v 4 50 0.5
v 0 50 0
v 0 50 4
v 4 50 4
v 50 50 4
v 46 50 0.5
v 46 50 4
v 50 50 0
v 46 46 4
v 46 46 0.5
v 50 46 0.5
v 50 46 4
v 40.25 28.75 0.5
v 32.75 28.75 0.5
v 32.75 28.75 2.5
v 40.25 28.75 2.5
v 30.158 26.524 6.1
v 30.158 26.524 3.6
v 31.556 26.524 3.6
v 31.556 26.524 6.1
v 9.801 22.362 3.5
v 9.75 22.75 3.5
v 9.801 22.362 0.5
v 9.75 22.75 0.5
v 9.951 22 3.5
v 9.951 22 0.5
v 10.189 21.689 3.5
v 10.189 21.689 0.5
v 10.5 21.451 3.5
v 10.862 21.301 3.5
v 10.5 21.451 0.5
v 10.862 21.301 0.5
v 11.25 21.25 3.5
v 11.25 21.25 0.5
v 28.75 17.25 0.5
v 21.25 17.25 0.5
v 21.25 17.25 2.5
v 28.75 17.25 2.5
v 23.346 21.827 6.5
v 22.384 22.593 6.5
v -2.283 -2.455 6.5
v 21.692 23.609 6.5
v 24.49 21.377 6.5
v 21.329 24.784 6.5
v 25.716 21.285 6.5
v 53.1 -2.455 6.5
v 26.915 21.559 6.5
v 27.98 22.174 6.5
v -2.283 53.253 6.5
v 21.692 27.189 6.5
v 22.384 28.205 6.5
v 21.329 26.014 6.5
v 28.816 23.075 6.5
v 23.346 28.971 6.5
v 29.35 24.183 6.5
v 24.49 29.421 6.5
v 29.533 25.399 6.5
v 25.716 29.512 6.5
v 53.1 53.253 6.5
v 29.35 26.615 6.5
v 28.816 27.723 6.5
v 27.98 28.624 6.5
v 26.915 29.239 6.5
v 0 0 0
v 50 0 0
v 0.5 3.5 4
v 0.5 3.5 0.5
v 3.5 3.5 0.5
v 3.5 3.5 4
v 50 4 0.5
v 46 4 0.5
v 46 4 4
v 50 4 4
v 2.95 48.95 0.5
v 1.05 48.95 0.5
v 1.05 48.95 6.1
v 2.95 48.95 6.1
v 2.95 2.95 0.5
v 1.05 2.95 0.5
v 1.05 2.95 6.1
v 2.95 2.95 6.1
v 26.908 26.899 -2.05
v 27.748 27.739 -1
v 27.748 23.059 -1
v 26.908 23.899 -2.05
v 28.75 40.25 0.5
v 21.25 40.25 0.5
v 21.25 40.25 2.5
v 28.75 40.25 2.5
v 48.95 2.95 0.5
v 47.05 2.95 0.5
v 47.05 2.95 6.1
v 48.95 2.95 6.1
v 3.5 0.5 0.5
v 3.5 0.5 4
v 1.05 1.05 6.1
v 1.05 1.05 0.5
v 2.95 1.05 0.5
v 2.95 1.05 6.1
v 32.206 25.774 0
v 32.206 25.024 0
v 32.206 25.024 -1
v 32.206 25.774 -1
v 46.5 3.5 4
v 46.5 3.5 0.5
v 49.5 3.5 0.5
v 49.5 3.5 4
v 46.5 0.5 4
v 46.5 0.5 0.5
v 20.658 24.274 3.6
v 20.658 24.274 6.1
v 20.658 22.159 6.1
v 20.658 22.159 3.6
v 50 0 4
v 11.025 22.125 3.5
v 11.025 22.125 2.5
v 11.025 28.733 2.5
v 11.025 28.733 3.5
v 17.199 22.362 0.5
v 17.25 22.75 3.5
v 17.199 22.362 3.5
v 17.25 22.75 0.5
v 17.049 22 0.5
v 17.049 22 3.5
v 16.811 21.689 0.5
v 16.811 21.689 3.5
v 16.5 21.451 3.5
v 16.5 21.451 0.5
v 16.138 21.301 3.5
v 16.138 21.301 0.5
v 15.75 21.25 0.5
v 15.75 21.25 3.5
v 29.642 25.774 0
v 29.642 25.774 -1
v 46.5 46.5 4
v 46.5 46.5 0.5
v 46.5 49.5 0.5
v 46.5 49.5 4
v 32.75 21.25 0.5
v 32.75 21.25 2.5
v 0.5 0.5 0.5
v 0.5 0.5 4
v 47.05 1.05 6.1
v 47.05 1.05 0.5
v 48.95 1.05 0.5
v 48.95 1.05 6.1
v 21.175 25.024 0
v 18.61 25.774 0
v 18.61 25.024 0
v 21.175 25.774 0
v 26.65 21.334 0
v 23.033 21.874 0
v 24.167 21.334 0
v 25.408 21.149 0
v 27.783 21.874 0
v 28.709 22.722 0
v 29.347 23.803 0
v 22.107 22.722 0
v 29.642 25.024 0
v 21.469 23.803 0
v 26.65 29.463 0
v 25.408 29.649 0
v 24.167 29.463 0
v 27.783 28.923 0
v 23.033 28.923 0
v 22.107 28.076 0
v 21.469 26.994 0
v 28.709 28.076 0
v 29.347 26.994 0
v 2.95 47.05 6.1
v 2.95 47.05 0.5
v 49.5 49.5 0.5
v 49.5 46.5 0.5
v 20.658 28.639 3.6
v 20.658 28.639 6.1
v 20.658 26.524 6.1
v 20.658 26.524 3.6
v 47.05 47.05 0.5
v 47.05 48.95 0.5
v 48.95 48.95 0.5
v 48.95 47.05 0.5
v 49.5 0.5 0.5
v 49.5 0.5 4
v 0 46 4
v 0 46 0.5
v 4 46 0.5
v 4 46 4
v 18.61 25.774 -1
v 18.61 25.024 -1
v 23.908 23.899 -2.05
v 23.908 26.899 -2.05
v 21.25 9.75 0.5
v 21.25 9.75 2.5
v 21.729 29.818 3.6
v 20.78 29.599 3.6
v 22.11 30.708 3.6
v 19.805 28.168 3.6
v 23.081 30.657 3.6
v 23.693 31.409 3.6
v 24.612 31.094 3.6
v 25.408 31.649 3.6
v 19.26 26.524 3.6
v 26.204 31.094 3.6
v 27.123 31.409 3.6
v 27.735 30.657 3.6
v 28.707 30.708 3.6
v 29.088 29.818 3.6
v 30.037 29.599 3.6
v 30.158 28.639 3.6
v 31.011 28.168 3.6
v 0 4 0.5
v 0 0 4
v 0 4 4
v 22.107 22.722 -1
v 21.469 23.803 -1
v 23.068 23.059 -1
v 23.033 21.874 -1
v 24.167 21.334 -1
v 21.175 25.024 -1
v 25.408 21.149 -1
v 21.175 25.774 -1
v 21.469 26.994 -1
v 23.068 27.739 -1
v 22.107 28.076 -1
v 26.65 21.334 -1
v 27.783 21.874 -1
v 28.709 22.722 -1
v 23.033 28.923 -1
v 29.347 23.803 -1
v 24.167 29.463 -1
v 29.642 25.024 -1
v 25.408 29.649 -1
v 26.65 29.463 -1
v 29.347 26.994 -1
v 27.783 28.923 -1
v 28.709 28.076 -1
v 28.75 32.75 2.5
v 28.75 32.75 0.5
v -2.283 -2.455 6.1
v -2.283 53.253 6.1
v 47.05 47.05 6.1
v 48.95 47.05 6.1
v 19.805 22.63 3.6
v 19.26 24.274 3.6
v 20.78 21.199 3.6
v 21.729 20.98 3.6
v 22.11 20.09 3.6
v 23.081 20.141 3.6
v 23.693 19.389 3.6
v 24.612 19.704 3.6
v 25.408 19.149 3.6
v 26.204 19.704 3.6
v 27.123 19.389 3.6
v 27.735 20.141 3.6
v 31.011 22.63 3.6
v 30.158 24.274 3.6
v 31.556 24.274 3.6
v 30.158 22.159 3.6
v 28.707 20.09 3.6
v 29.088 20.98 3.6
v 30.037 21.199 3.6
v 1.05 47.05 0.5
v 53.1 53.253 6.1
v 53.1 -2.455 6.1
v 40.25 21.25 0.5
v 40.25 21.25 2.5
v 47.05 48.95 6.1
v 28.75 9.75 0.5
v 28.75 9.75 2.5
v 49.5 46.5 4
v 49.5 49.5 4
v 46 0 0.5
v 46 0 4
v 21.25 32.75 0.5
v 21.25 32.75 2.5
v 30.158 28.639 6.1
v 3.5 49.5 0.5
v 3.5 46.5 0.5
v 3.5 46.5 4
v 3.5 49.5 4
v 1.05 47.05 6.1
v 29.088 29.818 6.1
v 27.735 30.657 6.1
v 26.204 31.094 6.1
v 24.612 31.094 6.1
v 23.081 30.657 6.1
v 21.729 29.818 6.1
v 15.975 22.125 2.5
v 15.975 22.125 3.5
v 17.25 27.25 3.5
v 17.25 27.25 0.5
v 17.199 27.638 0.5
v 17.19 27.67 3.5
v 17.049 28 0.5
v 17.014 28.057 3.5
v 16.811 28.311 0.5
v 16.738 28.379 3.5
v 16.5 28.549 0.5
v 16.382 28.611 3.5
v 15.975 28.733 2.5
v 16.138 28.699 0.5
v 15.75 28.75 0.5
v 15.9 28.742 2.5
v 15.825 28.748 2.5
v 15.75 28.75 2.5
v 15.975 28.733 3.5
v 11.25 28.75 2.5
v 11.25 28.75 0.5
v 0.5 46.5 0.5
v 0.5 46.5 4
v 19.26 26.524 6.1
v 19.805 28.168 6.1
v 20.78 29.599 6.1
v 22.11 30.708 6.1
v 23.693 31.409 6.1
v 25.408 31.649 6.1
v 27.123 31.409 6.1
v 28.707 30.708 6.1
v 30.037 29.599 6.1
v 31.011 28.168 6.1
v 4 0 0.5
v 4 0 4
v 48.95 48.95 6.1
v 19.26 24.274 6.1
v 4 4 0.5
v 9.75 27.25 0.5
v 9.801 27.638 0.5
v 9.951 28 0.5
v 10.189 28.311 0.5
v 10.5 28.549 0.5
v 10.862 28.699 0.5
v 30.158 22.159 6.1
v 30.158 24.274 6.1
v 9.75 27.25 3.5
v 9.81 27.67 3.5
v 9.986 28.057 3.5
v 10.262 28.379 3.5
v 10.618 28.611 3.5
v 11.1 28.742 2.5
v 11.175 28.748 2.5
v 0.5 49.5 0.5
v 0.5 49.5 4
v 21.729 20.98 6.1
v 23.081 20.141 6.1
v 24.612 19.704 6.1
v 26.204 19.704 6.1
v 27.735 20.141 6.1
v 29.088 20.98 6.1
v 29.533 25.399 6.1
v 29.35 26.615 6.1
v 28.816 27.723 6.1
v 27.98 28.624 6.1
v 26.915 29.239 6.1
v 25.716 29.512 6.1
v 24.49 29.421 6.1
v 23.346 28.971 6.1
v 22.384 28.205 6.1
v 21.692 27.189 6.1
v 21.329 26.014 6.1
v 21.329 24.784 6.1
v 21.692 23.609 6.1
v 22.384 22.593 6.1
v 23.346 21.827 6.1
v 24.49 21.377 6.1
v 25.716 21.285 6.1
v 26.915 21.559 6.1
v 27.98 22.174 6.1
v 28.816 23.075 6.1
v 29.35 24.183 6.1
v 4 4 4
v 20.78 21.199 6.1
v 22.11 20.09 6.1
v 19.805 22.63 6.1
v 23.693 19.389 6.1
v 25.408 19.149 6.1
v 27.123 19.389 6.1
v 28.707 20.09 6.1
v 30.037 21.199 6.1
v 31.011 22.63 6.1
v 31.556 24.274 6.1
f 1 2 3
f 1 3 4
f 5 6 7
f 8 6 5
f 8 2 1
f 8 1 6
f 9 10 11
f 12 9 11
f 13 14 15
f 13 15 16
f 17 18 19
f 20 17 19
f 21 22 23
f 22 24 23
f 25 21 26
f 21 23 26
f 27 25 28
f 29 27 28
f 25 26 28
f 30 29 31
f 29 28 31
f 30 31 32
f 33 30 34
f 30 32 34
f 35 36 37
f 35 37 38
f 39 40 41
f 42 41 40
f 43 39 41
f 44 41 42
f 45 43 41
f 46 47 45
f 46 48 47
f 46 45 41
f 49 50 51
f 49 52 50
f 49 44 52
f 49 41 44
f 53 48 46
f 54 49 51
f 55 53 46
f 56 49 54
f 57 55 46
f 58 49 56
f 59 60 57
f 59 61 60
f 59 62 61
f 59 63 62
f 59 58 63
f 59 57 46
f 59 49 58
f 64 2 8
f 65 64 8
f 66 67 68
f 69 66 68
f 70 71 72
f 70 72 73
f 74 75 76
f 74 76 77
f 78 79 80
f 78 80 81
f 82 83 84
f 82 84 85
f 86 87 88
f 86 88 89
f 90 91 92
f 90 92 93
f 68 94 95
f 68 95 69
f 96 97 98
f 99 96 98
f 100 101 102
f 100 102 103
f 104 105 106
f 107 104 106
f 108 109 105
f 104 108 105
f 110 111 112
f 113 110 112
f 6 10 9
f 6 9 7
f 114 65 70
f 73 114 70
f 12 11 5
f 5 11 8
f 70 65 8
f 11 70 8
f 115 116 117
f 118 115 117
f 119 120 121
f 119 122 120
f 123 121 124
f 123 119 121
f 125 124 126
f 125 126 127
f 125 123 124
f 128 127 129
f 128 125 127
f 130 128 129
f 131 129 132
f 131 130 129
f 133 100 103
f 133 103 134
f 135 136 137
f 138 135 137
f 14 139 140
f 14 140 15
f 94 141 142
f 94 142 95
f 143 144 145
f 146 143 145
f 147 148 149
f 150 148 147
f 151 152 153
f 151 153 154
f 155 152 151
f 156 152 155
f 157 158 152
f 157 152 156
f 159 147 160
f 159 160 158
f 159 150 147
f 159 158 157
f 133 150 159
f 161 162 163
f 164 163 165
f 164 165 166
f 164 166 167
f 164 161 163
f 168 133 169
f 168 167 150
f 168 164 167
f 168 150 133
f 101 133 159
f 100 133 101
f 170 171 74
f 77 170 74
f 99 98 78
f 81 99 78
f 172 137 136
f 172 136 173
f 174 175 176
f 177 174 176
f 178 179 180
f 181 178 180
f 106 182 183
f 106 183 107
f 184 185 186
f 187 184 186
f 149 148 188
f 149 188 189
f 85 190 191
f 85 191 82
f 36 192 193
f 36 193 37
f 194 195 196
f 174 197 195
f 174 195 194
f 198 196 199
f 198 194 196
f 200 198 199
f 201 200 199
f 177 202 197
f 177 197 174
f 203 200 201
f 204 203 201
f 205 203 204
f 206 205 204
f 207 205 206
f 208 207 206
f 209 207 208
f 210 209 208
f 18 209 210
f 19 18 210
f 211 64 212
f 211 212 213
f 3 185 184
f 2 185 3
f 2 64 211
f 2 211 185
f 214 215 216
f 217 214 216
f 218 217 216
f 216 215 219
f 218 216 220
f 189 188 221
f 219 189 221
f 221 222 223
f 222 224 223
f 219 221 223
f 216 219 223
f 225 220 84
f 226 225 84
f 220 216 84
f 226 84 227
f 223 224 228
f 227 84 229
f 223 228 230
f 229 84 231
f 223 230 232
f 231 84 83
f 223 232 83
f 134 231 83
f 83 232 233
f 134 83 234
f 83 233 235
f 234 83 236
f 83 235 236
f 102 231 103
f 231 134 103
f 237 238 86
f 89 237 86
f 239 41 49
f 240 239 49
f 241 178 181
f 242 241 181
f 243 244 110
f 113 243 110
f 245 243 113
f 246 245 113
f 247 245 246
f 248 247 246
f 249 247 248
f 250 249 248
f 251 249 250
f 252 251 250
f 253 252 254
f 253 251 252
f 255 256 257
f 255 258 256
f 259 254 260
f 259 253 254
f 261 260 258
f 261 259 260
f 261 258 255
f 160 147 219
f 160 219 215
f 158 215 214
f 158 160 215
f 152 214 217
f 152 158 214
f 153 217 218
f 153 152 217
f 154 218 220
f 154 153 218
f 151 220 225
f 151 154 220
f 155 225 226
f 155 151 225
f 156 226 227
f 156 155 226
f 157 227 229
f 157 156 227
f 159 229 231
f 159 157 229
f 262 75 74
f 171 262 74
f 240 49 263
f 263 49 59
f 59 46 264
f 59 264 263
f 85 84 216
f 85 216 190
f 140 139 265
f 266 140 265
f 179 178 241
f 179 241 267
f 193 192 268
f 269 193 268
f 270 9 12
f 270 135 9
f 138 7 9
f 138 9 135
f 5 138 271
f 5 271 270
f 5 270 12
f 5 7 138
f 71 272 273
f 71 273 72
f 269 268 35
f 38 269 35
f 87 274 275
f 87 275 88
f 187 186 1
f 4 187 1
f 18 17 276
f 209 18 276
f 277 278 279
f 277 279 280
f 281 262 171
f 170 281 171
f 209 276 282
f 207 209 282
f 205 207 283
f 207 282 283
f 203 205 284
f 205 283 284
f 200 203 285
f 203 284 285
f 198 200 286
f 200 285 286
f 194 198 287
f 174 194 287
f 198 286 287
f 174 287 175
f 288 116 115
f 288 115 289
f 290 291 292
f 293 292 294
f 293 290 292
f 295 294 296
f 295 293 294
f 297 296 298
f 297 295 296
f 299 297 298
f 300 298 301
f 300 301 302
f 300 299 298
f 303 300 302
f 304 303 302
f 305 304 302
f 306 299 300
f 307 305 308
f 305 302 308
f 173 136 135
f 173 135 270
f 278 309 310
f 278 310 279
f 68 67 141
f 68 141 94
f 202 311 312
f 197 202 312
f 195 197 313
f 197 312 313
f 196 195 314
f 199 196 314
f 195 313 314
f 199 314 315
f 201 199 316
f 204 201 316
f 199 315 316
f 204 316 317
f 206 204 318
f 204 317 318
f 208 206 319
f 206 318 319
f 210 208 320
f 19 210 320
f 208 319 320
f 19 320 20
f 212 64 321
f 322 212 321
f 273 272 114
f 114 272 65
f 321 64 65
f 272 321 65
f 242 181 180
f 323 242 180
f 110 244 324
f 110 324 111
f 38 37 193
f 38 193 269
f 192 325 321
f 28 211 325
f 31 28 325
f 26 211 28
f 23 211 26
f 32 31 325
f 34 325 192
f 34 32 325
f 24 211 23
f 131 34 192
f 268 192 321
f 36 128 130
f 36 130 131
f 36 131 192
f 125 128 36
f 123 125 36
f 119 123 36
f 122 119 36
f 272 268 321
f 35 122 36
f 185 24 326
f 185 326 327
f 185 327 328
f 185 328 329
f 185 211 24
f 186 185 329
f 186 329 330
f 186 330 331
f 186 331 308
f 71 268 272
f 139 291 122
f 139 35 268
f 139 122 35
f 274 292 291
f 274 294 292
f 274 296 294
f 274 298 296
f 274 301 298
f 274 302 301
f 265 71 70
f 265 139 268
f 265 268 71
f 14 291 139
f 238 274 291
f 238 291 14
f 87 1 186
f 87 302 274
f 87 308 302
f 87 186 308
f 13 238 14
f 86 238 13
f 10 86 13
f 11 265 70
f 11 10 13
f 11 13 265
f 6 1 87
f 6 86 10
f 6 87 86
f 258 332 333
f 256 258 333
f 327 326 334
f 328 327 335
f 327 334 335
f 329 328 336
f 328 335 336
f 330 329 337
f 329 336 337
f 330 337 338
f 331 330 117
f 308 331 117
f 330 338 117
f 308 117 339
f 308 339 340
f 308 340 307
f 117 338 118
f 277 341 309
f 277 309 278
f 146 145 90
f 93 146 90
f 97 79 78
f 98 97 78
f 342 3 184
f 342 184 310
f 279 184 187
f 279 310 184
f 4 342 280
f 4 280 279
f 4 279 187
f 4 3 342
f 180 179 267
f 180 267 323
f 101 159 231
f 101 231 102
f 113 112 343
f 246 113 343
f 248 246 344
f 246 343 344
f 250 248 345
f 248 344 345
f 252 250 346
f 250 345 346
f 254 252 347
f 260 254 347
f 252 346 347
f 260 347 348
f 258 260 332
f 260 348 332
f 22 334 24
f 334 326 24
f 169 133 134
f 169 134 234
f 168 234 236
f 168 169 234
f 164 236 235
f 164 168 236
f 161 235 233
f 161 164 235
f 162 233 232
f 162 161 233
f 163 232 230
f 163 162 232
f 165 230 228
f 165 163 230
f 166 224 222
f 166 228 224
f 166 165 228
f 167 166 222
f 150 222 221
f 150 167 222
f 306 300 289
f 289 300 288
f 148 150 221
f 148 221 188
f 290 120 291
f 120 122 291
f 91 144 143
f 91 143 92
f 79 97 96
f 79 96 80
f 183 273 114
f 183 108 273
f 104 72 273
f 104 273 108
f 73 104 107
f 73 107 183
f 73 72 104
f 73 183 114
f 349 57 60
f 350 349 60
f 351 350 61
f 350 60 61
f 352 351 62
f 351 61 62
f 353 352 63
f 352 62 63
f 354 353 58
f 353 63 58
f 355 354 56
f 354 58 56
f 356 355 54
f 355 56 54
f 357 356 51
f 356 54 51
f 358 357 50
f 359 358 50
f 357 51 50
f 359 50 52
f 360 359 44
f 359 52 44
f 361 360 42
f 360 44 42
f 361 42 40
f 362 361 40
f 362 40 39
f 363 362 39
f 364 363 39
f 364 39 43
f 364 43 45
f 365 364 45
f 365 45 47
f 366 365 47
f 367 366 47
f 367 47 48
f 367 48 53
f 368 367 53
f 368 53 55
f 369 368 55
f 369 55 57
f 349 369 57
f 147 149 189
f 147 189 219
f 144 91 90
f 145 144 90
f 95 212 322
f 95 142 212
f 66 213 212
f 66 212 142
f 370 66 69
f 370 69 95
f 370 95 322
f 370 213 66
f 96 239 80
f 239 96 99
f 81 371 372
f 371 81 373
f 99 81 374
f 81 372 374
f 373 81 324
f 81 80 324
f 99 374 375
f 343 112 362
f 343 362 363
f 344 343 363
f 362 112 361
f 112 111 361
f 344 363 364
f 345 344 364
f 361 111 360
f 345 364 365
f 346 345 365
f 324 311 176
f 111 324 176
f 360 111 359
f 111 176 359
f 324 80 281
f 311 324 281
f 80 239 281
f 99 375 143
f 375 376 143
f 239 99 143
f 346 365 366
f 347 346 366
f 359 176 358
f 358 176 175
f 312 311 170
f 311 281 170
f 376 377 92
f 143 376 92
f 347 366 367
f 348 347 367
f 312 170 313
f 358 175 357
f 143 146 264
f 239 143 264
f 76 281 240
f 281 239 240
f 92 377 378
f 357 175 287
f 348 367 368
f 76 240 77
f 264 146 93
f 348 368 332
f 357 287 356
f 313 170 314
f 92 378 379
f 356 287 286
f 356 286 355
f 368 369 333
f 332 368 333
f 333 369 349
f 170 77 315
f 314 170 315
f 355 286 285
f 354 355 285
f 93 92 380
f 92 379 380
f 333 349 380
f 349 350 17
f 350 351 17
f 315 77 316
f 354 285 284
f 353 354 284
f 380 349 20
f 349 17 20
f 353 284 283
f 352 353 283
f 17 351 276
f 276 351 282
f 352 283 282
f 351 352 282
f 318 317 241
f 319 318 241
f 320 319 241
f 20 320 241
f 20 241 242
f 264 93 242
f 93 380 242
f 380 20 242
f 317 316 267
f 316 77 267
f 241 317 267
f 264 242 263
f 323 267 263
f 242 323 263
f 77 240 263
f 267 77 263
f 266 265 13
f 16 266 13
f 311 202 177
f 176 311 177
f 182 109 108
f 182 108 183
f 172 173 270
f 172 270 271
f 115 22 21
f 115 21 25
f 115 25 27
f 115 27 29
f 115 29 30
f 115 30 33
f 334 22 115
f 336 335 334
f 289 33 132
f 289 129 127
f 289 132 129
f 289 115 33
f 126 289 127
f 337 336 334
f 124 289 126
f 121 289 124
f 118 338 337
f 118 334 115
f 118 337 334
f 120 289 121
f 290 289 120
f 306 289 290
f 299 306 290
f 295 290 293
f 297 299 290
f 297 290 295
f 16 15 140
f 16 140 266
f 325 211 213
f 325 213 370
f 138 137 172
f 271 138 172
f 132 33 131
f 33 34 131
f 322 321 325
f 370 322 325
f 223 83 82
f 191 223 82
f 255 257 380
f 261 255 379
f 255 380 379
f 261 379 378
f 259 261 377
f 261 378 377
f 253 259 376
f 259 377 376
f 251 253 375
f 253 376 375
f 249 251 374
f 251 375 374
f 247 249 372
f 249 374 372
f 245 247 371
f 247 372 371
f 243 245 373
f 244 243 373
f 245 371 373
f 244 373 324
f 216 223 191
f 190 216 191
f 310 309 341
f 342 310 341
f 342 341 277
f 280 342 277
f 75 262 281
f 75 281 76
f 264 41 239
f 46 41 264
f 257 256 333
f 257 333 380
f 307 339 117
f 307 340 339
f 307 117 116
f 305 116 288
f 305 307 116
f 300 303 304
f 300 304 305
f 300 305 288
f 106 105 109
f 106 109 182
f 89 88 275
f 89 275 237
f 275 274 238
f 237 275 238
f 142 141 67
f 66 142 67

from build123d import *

# Parameters (mm, degrees)
F0_W          = 50
F0_H          = 50
F1_DEPTH      = 0.5
F2_W          = 4
F2_H          = 4
F2_W_2        = 3
F2_H_2        = 3
F3_DEPTH      = 3.5
F2_W_3        = 1.9
F2_H_3        = 1.9
F4_DEPTH      = 6
F5_W          = 55.382803781
F5_H          = 55.7085196488
F5_W_2        = 1.9
F5_H_2        = 1.9
F6_DEPTH      = 0.4
F7_R          = 4.125
F8_DEPTH      = 25
F9_R          = 6.25
F10_DEPTH     = 2.5
F11_W         = 7.5
F11_H         = 3.75
F11_H_2       = 7.5
F12_DEPTH     = 2
F13_W         = 4.95
F13_H         = 0.875
F14_DEPTH     = 1
F15_R         = 1.5
F16_W         = 15
F16_H         = 2.25
F17_DEPTH     = 2.5
F19_DEPTH     = 1
F20_W         = 5
F20_H         = 5
F21_DEPTH     = 1.05
F22_T4_DEPTH  = 11.4471090443
F22_T9_DEPTH  = 11.4471090443
F22_T14_DEPTH = 11.4471090443
F22_T19_DEPTH = 11.4471090443


# Not quite as in the source:
# - a fillet or chamfer that OpenCascade refuses, or shapes differently, is made with other operations: its cross-section is extruded or revolved along the edge and cut away or added
# - a feature names something its author has since deleted; it is built from what else it names


with BuildPart() as f1:
    # F0 (on Top) → F1 (new body)
    with BuildSketch(Plane.XY):
        with Locations((25, 25)):
            Rectangle(F0_W, F0_H)
    extrude(amount=F1_DEPTH)

    # F2 (on face) → F3 (join)
    with BuildSketch(Plane.XY.offset(0.5)):
        with Locations((48, 48)):
            Rectangle(F2_W, F2_H)
        with Locations((48, 48)):
            Rectangle(F2_W_2, F2_H_2, mode=Mode.SUBTRACT)
        with Locations((2, 48)):
            Rectangle(F2_W, F2_H)
        with Locations((2, 48)):
            Rectangle(F2_W_2, F2_H_2, mode=Mode.SUBTRACT)
        with Locations((2, 2)):
            Rectangle(F2_W, F2_H)
        with Locations((2, 2)):
            Rectangle(F2_W_2, F2_H_2, mode=Mode.SUBTRACT)
        with Locations((48, 2)):
            Rectangle(F2_W, F2_H)
        with Locations((48, 2)):
            Rectangle(F2_W_2, F2_H_2, mode=Mode.SUBTRACT)
    extrude(amount=F3_DEPTH)

    # F11 (on face) → F12 (join)
    with BuildSketch(Plane.XY.offset(0.5)):
        with Locations((13.5, 26.875)):
            Rectangle(F11_W, F11_H)
        with Locations((13.5, 23.125)):
            Rectangle(F11_W, F11_H)
        with Locations((25, 13.5)):
            Rectangle(F11_W, F11_H_2)
        with Locations((36.5, 25)):
            Rectangle(F11_W, F11_H_2)
        with Locations((25, 36.5)):
            Rectangle(F11_W, F11_H_2)
    extrude(amount=F12_DEPTH)

    # F13 (on face) → F14 (join)
    with BuildSketch(Plane.XY.offset(2.5)):
        Polygon((15.975, 22.125), (15.975, 21.25), (17.25, 21.25), (17.25, 28.75), (15.975, 28.75), align=None)
        with Locations((13.5, 21.6875)):
            Rectangle(F13_W, F13_H)
        Polygon((9.75, 21.25), (11.025, 21.25), (11.025, 22.125), (11.025, 28.75), (9.75, 28.75), align=None)
    extrude(amount=F14_DEPTH)

    # F15
    f15_edges = [f1.edges().sort_by_distance(p)[0] for p in [
        (9.75, 28.75, 2),
        (17.25, 28.75, 2),
        (17.25, 21.25, 2),
        (9.75, 21.25, 2),
    ]]
    fillet(f15_edges, radius=F15_R)


with BuildPart() as f4:
    # F2 (on face) → F4 (new body)
    with BuildSketch(Plane.XY.offset(0.5)):
        with Locations((2, 48)):
            Rectangle(F2_W_3, F2_H_3)
    extrude(amount=F4_DEPTH)



with BuildPart() as f4b:
    # F2 (on face) → F4, piece 2 (new body)
    with BuildSketch(Plane.XY.offset(0.5)):
        with Locations((48, 48)):
            Rectangle(F2_W_3, F2_H_3)
    extrude(amount=F4_DEPTH)


with BuildPart() as f4c:
    # F2 (on face) → F4, piece 3 (new body)
    with BuildSketch(Plane.XY.offset(0.5)):
        with Locations((48, 2)):
            Rectangle(F2_W_3, F2_H_3)
    extrude(amount=F4_DEPTH)


with BuildPart() as f4d:
    # F2 (on face) → F4, piece 4 (new body)
    with BuildSketch(Plane.XY.offset(0.5)):
        with Locations((2, 2)):
            Rectangle(F2_W_3, F2_H_3)
    extrude(amount=F4_DEPTH)


with BuildPart() as f4_1:
    add(f4.part)

    add(f4b.part)  # F6 merges F4b

    add(f4c.part)  # F6 merges F4c

    add(f4d.part)  # F6 merges F4d
    # F5 (on face) → F6 (join)
    with BuildSketch(Plane.XY.offset(6.5)):
        with Locations((25.4082191968, 25.3989326302)):
            Rectangle(F5_W, F5_H)
        with Locations((48, 48)):
            Rectangle(F5_W_2, F5_H_2, mode=Mode.SUBTRACT)
    extrude(amount=-F6_DEPTH)

    # F7 (on face) → F8 (cut)
    with BuildSketch(Plane.XY.offset(6.5)):
        with Locations((25.4082191968, 25.3989326302)):
            Circle(F7_R)
    extrude(amount=-F8_DEPTH, mode=Mode.SUBTRACT)

    # F9 (on face) → F10 (join)
    with BuildSketch(Plane(origin=(0, 0, 6.1), x_dir=(1, 0, 0), z_dir=(0, 0, -1))):
        with Locations((25.4082191968, -25.3989326302)):
            Circle(F9_R)
        with BuildLine():
            ThreePointArc((30.1582191968, -22.158562281), (30.9025344408, -23.7033501344), (31.1582191968, -25.3989326302))
            ThreePointArc((31.1582191968, -25.3989326302), (30.9025344408, -27.094515126), (30.1582191968, -28.6393029794))
            ThreePointArc((30.1582191968, -28.6393029794), (25.4082191968, -31.1489326302), (20.6582191968, -28.6393029794))
            ThreePointArc((20.6582191968, -28.6393029794), (19.6582191968, -25.3989326302), (20.6582191968, -22.158562281))
            ThreePointArc((20.6582191968, -22.158562281), (25.4082191968, -19.6489326302), (30.1582191968, -22.158562281))
        make_face(mode=Mode.SUBTRACT)
        with BuildLine():
            ThreePointArc((30.1582191968, -28.6393029794), (30.9025344408, -27.094515126), (31.1582191968, -25.3989326302))
            ThreePointArc((31.1582191968, -25.3989326302), (30.9025344408, -23.7033501344), (30.1582191968, -22.158562281))
            Line((30.1582191968, -22.158562281), (30.1582191968, -28.6393029794))
        make_face()
        with BuildLine():
            Line((20.6582191968, -28.6393029794), (20.6582191968, -22.158562281))
            ThreePointArc((20.6582191968, -22.158562281), (19.6582191968, -25.3989326302), (20.6582191968, -28.6393029794))
        make_face()
    extrude(amount=F10_DEPTH)

    # F16 (on face) → F17 (cut, through all)
    with BuildSketch(Plane(origin=(0, 0, 3.6), x_dir=(1, 0, 0), z_dir=(0, 0, -1))):
        with Locations((25.4082191968, -25.3989326302)):
            Rectangle(F16_W, F16_H)
    extrude(amount=-F17_DEPTH, mode=Mode.SUBTRACT)


with BuildPart() as f19:
    # F18 (on Top) → F19 (new body)
    with BuildSketch(Plane.XY):
        with BuildLine():
            ThreePointArc((29.6416427523, 25.0239326302), (29.6540730633, 25.2112495339), (29.6582191968, 25.3989326302))
            ThreePointArc((29.6582191968, 25.3989326302), (29.6540730633, 25.5866157265), (29.6416427523, 25.7739326302))
            Line((29.6416427523, 25.7739326302), (25.4082191968, 25.7739326302))
            Line((25.4082191968, 25.7739326302), (21.1747956414, 25.7739326302))
            ThreePointArc((21.1747956414, 25.7739326302), (21.1582191968, 25.3989326302), (21.1747956414, 25.0239326302))
            Line((21.1747956414, 25.0239326302), (25.4082191968, 25.0239326302))
            Line((25.4082191968, 25.0239326302), (29.6416427523, 25.0239326302))
        make_face()
        with BuildLine():
            ThreePointArc((29.6416427523, 25.7739326302), (29.6540730633, 25.5866157265), (29.6582191968, 25.3989326302))
            ThreePointArc((29.6582191968, 25.3989326302), (29.6540730633, 25.2112495339), (29.6416427523, 25.0239326302))
            Line((29.6416427523, 25.0239326302), (32.2061355105, 25.0239326302))
            Line((32.2061355105, 25.0239326302), (32.2061355105, 25.3989326302))
            Line((32.2061355105, 25.3989326302), (32.2061355105, 25.7739326302))
            Line((32.2061355105, 25.7739326302), (29.6416427523, 25.7739326302))
        make_face()
        with BuildLine():
            Line((25.4082191968, 25.7739326302), (29.6416427523, 25.7739326302))
            ThreePointArc((29.6416427523, 25.7739326302), (25.4082191968, 29.6489326302), (21.1747956414, 25.7739326302))
            Line((21.1747956414, 25.7739326302), (25.4082191968, 25.7739326302))
        make_face()
        with BuildLine():
            ThreePointArc((21.1747956414, 25.0239326302), (25.4082191968, 21.1489326302), (29.6416427523, 25.0239326302))
            Line((29.6416427523, 25.0239326302), (25.4082191968, 25.0239326302))
            Line((25.4082191968, 25.0239326302), (21.1747956414, 25.0239326302))
        make_face()
        with BuildLine():
            ThreePointArc((21.1747956414, 25.0239326302), (21.1582191968, 25.3989326302), (21.1747956414, 25.7739326302))
            Line((21.1747956414, 25.7739326302), (18.6103028832, 25.7739326302))
            Line((18.6103028832, 25.7739326302), (18.6103028832, 25.3989326302))
            Line((18.6103028832, 25.3989326302), (18.6103028832, 25.0239326302))
            Line((18.6103028832, 25.0239326302), (21.1747956414, 25.0239326302))
        make_face()
    extrude(amount=-F19_DEPTH)

    # F20 (on face) → F21 (join)
    with BuildSketch(Plane(origin=(0, 0, -1), x_dir=(1, 0, 0), z_dir=(0, 0, -1))):
        with Locations((25.4082191968, -25.3989326302)):
            Rectangle(F20_W, F20_H)
    extrude(amount=F21_DEPTH)

    # F22: chamfer of 1 x 1.25 on 4 edges, made by hand


with BuildPart() as f22_tool2:
    # F22_s3 → F22_t4 (new body)
    with BuildSketch(Plane.XZ.offset(-31.1224871524)):
        Polygon((27.9082191968, -0.8), (26.9082191968, -2.05), (27.9082191968, -2.05), align=None)
    extrude(amount=F22_T4_DEPTH)

    split(bisect_by=Plane.XY.offset(-1), keep=Keep.BOTTOM)


with BuildPart() as f19_1:
    add(f19.part)

    # F22_t1: cut F22_tool2
    add(f22_tool2.part, mode=Mode.SUBTRACT)


with BuildPart() as f22_tool7:
    # F22_s8 → F22_t9 (new body)
    with BuildSketch(Plane.YZ.offset(31.131773719)):
        Polygon((22.8989326302, -0.8), (23.8989326302, -2.05), (22.8989326302, -2.05), align=None)
    extrude(amount=-F22_T9_DEPTH)

    split(bisect_by=Plane.XY.offset(-1), keep=Keep.BOTTOM)


with BuildPart() as f19_2:
    add(f19_1.part)

    # F22_t6: cut F22_tool7
    add(f22_tool7.part, mode=Mode.SUBTRACT)


with BuildPart() as f22_tool12:
    # F22_s13 → F22_t14 (new body)
    with BuildSketch(Plane.XZ.offset(-19.675378108)):
        Polygon((22.9082191968, -0.8), (23.9082191968, -2.05), (22.9082191968, -2.05), align=None)
    extrude(amount=-F22_T14_DEPTH)

    split(bisect_by=Plane.XY.offset(-1), keep=Keep.BOTTOM)


with BuildPart() as f19_3:
    add(f19_2.part)

    # F22_t11: cut F22_tool12
    add(f22_tool12.part, mode=Mode.SUBTRACT)


with BuildPart() as f22_tool17:
    # F22_s18 → F22_t19 (new body)
    with BuildSketch(Plane.YZ.offset(19.6846646747)):
        Polygon((27.8989326302, -0.8), (26.8989326302, -2.05), (27.8989326302, -2.05), align=None)
    extrude(amount=F22_T19_DEPTH)

    split(bisect_by=Plane.XY.offset(-1), keep=Keep.BOTTOM)


with BuildPart() as f19_4:
    add(f19_3.part)

    # F22_t16: cut F22_tool17
    add(f22_tool17.part, mode=Mode.SUBTRACT)


solid = Compound([f1.part, f4_1.part, f19_4.part])
